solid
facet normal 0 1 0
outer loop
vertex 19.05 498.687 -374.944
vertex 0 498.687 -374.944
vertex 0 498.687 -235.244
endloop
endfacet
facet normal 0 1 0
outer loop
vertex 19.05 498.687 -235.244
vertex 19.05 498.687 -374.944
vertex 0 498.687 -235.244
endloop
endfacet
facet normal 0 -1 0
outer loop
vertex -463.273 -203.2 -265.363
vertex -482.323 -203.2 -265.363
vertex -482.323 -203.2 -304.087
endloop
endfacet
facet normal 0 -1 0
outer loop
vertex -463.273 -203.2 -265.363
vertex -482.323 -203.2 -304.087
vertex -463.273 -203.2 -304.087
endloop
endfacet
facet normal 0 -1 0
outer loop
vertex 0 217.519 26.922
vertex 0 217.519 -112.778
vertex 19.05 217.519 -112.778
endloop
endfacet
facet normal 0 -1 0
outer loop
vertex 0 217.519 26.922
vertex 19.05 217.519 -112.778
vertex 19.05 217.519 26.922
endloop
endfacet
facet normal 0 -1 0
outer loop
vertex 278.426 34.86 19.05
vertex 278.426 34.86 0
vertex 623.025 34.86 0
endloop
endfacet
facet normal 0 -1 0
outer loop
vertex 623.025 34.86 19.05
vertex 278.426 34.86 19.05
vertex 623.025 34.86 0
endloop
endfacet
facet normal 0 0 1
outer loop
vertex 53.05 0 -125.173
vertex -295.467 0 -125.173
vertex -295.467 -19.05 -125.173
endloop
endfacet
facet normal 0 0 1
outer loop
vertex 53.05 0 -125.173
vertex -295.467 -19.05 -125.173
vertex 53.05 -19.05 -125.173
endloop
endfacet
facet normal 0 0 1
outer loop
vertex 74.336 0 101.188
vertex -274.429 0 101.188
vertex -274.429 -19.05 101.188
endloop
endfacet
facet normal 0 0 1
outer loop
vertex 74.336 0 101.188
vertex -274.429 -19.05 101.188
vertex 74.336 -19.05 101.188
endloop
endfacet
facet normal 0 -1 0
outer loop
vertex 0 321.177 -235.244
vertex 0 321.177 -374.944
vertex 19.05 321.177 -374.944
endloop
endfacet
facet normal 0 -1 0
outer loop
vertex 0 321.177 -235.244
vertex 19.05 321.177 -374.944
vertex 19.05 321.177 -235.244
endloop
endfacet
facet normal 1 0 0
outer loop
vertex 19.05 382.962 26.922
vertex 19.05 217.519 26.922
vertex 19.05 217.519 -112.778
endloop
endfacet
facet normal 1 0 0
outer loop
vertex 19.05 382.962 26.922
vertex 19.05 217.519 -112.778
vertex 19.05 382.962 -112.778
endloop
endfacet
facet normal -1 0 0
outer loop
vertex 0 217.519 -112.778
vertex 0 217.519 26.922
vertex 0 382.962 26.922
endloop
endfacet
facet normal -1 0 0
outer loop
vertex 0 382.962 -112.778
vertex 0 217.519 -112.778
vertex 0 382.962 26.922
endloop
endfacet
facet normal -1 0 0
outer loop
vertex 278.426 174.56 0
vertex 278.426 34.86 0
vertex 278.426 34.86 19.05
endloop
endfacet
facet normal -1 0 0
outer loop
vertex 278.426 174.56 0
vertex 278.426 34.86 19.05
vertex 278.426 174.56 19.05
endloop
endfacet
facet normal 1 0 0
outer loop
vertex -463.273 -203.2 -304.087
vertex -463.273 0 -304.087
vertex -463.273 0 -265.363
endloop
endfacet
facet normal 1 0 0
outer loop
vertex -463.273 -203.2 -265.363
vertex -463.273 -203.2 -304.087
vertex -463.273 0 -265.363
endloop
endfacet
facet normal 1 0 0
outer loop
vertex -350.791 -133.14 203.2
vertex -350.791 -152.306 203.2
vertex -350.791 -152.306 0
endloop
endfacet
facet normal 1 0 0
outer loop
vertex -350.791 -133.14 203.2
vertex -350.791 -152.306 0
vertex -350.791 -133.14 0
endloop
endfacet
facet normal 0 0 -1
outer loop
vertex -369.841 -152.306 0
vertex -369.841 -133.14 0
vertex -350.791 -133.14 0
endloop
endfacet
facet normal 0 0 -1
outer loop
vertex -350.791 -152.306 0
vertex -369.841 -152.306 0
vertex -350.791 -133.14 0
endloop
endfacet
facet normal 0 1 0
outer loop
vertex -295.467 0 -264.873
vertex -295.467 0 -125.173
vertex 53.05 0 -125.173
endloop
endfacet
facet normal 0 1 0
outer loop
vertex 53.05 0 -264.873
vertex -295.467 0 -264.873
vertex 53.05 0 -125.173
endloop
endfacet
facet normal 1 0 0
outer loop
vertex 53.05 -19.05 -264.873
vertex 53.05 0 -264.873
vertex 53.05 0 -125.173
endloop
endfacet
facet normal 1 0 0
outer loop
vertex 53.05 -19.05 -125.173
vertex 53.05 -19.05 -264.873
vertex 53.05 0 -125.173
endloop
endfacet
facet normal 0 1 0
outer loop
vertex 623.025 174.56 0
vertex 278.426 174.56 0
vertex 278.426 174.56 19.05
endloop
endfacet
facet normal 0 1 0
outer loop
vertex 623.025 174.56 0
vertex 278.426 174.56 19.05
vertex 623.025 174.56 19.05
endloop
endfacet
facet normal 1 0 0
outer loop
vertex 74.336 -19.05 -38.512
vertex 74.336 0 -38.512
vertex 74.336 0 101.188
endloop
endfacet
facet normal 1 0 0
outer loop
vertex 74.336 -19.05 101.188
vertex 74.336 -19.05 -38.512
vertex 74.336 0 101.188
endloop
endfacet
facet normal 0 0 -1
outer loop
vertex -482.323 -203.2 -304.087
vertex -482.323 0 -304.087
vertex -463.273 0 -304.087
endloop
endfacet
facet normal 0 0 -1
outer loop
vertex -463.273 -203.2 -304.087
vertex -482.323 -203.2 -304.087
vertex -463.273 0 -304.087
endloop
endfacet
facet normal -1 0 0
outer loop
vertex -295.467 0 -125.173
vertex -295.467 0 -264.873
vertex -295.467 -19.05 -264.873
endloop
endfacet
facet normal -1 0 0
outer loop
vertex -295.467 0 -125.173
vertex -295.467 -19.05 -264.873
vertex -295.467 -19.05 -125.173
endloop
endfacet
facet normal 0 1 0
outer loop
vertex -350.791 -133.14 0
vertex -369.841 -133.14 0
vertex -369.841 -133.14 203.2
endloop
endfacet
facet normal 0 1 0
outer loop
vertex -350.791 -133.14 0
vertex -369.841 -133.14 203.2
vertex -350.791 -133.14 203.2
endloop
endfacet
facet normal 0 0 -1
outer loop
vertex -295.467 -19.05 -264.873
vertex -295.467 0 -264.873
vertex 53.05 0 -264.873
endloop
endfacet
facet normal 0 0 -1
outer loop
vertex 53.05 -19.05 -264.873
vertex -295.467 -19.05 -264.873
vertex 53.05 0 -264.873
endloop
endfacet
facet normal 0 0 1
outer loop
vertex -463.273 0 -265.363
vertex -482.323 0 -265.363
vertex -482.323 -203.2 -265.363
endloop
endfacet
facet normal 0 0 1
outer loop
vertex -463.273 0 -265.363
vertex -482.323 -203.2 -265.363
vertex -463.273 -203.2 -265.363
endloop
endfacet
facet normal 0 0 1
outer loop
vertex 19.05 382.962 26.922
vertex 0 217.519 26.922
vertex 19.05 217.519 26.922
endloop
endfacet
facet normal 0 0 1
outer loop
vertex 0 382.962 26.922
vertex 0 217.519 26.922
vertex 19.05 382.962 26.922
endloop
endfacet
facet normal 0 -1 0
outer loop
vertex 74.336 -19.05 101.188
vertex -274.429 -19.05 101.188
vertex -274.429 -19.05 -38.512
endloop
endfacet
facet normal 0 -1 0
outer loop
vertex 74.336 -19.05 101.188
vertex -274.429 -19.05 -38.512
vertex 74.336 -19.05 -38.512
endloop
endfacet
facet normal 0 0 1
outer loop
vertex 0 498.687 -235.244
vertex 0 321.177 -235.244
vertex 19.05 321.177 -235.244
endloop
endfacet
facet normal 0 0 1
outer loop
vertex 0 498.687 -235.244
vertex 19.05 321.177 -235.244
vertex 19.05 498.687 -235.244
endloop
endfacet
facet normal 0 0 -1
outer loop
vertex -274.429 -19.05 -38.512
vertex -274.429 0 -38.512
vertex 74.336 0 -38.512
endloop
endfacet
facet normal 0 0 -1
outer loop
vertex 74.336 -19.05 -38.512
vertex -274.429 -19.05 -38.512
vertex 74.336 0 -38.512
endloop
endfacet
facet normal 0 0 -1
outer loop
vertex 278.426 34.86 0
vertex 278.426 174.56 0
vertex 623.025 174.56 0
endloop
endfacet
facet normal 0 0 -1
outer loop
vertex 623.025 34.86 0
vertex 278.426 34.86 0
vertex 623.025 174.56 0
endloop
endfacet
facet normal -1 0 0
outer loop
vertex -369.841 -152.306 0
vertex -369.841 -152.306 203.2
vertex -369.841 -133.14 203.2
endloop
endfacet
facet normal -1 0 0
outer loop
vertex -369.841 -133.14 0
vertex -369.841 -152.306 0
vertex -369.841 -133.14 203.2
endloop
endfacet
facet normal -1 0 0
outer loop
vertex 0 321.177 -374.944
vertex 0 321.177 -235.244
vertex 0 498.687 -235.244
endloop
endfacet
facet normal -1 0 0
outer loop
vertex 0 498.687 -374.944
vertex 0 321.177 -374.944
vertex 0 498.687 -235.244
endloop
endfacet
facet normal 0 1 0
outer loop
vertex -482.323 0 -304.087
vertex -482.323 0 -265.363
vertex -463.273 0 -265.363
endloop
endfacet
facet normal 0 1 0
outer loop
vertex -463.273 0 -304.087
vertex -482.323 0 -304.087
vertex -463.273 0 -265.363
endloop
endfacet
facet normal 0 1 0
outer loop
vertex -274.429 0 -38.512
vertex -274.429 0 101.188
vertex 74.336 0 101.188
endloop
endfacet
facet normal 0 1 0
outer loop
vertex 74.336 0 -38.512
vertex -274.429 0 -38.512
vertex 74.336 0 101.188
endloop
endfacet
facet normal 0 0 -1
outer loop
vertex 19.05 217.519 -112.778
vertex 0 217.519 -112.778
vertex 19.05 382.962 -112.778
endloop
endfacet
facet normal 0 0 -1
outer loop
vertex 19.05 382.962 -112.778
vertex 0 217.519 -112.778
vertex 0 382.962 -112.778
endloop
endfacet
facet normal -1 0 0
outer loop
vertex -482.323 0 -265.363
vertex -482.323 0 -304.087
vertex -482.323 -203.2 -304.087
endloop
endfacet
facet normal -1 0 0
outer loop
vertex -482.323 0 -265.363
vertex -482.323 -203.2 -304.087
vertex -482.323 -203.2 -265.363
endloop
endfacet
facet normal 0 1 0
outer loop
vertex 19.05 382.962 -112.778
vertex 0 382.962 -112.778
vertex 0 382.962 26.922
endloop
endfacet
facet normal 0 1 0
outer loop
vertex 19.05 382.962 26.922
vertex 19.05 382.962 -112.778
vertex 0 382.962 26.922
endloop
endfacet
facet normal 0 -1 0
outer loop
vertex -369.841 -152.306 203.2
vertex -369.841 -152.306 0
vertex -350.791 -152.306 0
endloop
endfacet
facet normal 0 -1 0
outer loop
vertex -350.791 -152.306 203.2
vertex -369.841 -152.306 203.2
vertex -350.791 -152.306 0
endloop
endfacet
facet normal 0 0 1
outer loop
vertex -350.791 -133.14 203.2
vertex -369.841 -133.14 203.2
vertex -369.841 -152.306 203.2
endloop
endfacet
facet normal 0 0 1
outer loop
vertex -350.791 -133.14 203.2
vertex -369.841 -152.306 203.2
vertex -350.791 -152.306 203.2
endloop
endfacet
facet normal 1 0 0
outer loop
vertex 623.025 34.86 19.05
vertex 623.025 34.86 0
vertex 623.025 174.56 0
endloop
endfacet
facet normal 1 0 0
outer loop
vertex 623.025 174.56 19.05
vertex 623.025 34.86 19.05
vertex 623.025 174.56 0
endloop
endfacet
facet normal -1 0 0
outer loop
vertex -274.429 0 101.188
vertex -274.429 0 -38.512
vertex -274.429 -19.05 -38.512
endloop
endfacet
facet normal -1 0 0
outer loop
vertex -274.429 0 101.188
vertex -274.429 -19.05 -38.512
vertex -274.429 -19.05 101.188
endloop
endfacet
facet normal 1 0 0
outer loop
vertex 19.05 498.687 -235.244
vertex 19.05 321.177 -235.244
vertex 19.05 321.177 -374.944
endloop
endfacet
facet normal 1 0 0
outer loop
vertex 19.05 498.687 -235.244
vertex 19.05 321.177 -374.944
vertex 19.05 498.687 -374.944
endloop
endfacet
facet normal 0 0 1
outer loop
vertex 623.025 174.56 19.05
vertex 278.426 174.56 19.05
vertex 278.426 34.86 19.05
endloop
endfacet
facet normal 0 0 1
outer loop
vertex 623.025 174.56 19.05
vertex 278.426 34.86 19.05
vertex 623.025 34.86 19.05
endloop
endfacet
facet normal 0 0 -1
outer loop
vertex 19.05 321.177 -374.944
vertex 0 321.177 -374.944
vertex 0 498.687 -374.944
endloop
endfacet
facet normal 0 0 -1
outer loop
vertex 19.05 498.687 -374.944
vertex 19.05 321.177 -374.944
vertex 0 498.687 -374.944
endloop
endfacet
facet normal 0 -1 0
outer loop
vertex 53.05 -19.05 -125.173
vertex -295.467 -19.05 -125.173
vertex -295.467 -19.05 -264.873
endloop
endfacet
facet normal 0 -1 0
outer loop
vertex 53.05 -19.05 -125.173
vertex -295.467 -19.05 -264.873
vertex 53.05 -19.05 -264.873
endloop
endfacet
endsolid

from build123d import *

# Parameters (mm, degrees)
F0_W      = 348.765551
F0_H      = 139.7
F1_DEPTH  = 19.05
F2_W      = 348.517242
F2_H      = 139.7
F3_DEPTH  = 19.05
F4_W      = 165.443052
F4_H      = 139.7
F5_DEPTH  = 19.05
F6_W      = 177.509875
F6_H      = 139.7
F7_DEPTH  = 19.05
F8_W      = 19.05
F8_H      = 19.165736
F9_DEPTH  = 203.2
F10_W     = 19.05
F10_H     = 38.723851
F11_DEPTH = 203.2
F12_W     = 344.59879
F12_H     = 139.7
F13_DEPTH = 19.05


with BuildPart() as f1:
    # F0 (on Front) → F1 (new body)
    with BuildSketch(Plane.XZ):
        with Locations((-100.046531, 31.338243)):
            Rectangle(F0_W, F0_H)
    extrude(amount=F1_DEPTH)


with BuildPart() as f3:
    # F2 (on Front) → F3 (new body)
    with BuildSketch(Plane.XZ):
        with Locations((-121.208172, -195.022788)):
            Rectangle(F2_W, F2_H)
    extrude(amount=F3_DEPTH)


with BuildPart() as f5:
    # F4 (on Right) → F5 (new body)
    with BuildSketch(Plane.YZ):
        with Locations((300.24004, -42.928476)):
            Rectangle(F4_W, F4_H)
    extrude(amount=F5_DEPTH)


with BuildPart() as f7:
    # F6 (on Right) → F7 (new body)
    with BuildSketch(Plane.YZ):
        with Locations((409.932136, -305.094056)):
            Rectangle(F6_W, F6_H)
    extrude(amount=F7_DEPTH)


with BuildPart() as f9:
    # F8 (on Top) → F9 (new body)
    with BuildSketch(Plane.XY):
        with Locations((-360.31574, -142.722741)):
            Rectangle(F8_W, F8_H)
    extrude(amount=F9_DEPTH)


with BuildPart() as f11:
    # F10 (on Front) → F11 (new body)
    with BuildSketch(Plane.XZ):
        with Locations((-472.798452, -284.725294)):
            Rectangle(F10_W, F10_H)
    extrude(amount=F11_DEPTH)


with BuildPart() as f13:
    # F12 (on Top) → F13 (new body)
    with BuildSketch(Plane.XY):
        with Locations((450.725451, 104.710254)):
            Rectangle(F12_W, F12_H)
    extrude(amount=F13_DEPTH)


solid = Compound([f1.part, f3.part, f5.part, f7.part, f9.part, f11.part, f13.part])
